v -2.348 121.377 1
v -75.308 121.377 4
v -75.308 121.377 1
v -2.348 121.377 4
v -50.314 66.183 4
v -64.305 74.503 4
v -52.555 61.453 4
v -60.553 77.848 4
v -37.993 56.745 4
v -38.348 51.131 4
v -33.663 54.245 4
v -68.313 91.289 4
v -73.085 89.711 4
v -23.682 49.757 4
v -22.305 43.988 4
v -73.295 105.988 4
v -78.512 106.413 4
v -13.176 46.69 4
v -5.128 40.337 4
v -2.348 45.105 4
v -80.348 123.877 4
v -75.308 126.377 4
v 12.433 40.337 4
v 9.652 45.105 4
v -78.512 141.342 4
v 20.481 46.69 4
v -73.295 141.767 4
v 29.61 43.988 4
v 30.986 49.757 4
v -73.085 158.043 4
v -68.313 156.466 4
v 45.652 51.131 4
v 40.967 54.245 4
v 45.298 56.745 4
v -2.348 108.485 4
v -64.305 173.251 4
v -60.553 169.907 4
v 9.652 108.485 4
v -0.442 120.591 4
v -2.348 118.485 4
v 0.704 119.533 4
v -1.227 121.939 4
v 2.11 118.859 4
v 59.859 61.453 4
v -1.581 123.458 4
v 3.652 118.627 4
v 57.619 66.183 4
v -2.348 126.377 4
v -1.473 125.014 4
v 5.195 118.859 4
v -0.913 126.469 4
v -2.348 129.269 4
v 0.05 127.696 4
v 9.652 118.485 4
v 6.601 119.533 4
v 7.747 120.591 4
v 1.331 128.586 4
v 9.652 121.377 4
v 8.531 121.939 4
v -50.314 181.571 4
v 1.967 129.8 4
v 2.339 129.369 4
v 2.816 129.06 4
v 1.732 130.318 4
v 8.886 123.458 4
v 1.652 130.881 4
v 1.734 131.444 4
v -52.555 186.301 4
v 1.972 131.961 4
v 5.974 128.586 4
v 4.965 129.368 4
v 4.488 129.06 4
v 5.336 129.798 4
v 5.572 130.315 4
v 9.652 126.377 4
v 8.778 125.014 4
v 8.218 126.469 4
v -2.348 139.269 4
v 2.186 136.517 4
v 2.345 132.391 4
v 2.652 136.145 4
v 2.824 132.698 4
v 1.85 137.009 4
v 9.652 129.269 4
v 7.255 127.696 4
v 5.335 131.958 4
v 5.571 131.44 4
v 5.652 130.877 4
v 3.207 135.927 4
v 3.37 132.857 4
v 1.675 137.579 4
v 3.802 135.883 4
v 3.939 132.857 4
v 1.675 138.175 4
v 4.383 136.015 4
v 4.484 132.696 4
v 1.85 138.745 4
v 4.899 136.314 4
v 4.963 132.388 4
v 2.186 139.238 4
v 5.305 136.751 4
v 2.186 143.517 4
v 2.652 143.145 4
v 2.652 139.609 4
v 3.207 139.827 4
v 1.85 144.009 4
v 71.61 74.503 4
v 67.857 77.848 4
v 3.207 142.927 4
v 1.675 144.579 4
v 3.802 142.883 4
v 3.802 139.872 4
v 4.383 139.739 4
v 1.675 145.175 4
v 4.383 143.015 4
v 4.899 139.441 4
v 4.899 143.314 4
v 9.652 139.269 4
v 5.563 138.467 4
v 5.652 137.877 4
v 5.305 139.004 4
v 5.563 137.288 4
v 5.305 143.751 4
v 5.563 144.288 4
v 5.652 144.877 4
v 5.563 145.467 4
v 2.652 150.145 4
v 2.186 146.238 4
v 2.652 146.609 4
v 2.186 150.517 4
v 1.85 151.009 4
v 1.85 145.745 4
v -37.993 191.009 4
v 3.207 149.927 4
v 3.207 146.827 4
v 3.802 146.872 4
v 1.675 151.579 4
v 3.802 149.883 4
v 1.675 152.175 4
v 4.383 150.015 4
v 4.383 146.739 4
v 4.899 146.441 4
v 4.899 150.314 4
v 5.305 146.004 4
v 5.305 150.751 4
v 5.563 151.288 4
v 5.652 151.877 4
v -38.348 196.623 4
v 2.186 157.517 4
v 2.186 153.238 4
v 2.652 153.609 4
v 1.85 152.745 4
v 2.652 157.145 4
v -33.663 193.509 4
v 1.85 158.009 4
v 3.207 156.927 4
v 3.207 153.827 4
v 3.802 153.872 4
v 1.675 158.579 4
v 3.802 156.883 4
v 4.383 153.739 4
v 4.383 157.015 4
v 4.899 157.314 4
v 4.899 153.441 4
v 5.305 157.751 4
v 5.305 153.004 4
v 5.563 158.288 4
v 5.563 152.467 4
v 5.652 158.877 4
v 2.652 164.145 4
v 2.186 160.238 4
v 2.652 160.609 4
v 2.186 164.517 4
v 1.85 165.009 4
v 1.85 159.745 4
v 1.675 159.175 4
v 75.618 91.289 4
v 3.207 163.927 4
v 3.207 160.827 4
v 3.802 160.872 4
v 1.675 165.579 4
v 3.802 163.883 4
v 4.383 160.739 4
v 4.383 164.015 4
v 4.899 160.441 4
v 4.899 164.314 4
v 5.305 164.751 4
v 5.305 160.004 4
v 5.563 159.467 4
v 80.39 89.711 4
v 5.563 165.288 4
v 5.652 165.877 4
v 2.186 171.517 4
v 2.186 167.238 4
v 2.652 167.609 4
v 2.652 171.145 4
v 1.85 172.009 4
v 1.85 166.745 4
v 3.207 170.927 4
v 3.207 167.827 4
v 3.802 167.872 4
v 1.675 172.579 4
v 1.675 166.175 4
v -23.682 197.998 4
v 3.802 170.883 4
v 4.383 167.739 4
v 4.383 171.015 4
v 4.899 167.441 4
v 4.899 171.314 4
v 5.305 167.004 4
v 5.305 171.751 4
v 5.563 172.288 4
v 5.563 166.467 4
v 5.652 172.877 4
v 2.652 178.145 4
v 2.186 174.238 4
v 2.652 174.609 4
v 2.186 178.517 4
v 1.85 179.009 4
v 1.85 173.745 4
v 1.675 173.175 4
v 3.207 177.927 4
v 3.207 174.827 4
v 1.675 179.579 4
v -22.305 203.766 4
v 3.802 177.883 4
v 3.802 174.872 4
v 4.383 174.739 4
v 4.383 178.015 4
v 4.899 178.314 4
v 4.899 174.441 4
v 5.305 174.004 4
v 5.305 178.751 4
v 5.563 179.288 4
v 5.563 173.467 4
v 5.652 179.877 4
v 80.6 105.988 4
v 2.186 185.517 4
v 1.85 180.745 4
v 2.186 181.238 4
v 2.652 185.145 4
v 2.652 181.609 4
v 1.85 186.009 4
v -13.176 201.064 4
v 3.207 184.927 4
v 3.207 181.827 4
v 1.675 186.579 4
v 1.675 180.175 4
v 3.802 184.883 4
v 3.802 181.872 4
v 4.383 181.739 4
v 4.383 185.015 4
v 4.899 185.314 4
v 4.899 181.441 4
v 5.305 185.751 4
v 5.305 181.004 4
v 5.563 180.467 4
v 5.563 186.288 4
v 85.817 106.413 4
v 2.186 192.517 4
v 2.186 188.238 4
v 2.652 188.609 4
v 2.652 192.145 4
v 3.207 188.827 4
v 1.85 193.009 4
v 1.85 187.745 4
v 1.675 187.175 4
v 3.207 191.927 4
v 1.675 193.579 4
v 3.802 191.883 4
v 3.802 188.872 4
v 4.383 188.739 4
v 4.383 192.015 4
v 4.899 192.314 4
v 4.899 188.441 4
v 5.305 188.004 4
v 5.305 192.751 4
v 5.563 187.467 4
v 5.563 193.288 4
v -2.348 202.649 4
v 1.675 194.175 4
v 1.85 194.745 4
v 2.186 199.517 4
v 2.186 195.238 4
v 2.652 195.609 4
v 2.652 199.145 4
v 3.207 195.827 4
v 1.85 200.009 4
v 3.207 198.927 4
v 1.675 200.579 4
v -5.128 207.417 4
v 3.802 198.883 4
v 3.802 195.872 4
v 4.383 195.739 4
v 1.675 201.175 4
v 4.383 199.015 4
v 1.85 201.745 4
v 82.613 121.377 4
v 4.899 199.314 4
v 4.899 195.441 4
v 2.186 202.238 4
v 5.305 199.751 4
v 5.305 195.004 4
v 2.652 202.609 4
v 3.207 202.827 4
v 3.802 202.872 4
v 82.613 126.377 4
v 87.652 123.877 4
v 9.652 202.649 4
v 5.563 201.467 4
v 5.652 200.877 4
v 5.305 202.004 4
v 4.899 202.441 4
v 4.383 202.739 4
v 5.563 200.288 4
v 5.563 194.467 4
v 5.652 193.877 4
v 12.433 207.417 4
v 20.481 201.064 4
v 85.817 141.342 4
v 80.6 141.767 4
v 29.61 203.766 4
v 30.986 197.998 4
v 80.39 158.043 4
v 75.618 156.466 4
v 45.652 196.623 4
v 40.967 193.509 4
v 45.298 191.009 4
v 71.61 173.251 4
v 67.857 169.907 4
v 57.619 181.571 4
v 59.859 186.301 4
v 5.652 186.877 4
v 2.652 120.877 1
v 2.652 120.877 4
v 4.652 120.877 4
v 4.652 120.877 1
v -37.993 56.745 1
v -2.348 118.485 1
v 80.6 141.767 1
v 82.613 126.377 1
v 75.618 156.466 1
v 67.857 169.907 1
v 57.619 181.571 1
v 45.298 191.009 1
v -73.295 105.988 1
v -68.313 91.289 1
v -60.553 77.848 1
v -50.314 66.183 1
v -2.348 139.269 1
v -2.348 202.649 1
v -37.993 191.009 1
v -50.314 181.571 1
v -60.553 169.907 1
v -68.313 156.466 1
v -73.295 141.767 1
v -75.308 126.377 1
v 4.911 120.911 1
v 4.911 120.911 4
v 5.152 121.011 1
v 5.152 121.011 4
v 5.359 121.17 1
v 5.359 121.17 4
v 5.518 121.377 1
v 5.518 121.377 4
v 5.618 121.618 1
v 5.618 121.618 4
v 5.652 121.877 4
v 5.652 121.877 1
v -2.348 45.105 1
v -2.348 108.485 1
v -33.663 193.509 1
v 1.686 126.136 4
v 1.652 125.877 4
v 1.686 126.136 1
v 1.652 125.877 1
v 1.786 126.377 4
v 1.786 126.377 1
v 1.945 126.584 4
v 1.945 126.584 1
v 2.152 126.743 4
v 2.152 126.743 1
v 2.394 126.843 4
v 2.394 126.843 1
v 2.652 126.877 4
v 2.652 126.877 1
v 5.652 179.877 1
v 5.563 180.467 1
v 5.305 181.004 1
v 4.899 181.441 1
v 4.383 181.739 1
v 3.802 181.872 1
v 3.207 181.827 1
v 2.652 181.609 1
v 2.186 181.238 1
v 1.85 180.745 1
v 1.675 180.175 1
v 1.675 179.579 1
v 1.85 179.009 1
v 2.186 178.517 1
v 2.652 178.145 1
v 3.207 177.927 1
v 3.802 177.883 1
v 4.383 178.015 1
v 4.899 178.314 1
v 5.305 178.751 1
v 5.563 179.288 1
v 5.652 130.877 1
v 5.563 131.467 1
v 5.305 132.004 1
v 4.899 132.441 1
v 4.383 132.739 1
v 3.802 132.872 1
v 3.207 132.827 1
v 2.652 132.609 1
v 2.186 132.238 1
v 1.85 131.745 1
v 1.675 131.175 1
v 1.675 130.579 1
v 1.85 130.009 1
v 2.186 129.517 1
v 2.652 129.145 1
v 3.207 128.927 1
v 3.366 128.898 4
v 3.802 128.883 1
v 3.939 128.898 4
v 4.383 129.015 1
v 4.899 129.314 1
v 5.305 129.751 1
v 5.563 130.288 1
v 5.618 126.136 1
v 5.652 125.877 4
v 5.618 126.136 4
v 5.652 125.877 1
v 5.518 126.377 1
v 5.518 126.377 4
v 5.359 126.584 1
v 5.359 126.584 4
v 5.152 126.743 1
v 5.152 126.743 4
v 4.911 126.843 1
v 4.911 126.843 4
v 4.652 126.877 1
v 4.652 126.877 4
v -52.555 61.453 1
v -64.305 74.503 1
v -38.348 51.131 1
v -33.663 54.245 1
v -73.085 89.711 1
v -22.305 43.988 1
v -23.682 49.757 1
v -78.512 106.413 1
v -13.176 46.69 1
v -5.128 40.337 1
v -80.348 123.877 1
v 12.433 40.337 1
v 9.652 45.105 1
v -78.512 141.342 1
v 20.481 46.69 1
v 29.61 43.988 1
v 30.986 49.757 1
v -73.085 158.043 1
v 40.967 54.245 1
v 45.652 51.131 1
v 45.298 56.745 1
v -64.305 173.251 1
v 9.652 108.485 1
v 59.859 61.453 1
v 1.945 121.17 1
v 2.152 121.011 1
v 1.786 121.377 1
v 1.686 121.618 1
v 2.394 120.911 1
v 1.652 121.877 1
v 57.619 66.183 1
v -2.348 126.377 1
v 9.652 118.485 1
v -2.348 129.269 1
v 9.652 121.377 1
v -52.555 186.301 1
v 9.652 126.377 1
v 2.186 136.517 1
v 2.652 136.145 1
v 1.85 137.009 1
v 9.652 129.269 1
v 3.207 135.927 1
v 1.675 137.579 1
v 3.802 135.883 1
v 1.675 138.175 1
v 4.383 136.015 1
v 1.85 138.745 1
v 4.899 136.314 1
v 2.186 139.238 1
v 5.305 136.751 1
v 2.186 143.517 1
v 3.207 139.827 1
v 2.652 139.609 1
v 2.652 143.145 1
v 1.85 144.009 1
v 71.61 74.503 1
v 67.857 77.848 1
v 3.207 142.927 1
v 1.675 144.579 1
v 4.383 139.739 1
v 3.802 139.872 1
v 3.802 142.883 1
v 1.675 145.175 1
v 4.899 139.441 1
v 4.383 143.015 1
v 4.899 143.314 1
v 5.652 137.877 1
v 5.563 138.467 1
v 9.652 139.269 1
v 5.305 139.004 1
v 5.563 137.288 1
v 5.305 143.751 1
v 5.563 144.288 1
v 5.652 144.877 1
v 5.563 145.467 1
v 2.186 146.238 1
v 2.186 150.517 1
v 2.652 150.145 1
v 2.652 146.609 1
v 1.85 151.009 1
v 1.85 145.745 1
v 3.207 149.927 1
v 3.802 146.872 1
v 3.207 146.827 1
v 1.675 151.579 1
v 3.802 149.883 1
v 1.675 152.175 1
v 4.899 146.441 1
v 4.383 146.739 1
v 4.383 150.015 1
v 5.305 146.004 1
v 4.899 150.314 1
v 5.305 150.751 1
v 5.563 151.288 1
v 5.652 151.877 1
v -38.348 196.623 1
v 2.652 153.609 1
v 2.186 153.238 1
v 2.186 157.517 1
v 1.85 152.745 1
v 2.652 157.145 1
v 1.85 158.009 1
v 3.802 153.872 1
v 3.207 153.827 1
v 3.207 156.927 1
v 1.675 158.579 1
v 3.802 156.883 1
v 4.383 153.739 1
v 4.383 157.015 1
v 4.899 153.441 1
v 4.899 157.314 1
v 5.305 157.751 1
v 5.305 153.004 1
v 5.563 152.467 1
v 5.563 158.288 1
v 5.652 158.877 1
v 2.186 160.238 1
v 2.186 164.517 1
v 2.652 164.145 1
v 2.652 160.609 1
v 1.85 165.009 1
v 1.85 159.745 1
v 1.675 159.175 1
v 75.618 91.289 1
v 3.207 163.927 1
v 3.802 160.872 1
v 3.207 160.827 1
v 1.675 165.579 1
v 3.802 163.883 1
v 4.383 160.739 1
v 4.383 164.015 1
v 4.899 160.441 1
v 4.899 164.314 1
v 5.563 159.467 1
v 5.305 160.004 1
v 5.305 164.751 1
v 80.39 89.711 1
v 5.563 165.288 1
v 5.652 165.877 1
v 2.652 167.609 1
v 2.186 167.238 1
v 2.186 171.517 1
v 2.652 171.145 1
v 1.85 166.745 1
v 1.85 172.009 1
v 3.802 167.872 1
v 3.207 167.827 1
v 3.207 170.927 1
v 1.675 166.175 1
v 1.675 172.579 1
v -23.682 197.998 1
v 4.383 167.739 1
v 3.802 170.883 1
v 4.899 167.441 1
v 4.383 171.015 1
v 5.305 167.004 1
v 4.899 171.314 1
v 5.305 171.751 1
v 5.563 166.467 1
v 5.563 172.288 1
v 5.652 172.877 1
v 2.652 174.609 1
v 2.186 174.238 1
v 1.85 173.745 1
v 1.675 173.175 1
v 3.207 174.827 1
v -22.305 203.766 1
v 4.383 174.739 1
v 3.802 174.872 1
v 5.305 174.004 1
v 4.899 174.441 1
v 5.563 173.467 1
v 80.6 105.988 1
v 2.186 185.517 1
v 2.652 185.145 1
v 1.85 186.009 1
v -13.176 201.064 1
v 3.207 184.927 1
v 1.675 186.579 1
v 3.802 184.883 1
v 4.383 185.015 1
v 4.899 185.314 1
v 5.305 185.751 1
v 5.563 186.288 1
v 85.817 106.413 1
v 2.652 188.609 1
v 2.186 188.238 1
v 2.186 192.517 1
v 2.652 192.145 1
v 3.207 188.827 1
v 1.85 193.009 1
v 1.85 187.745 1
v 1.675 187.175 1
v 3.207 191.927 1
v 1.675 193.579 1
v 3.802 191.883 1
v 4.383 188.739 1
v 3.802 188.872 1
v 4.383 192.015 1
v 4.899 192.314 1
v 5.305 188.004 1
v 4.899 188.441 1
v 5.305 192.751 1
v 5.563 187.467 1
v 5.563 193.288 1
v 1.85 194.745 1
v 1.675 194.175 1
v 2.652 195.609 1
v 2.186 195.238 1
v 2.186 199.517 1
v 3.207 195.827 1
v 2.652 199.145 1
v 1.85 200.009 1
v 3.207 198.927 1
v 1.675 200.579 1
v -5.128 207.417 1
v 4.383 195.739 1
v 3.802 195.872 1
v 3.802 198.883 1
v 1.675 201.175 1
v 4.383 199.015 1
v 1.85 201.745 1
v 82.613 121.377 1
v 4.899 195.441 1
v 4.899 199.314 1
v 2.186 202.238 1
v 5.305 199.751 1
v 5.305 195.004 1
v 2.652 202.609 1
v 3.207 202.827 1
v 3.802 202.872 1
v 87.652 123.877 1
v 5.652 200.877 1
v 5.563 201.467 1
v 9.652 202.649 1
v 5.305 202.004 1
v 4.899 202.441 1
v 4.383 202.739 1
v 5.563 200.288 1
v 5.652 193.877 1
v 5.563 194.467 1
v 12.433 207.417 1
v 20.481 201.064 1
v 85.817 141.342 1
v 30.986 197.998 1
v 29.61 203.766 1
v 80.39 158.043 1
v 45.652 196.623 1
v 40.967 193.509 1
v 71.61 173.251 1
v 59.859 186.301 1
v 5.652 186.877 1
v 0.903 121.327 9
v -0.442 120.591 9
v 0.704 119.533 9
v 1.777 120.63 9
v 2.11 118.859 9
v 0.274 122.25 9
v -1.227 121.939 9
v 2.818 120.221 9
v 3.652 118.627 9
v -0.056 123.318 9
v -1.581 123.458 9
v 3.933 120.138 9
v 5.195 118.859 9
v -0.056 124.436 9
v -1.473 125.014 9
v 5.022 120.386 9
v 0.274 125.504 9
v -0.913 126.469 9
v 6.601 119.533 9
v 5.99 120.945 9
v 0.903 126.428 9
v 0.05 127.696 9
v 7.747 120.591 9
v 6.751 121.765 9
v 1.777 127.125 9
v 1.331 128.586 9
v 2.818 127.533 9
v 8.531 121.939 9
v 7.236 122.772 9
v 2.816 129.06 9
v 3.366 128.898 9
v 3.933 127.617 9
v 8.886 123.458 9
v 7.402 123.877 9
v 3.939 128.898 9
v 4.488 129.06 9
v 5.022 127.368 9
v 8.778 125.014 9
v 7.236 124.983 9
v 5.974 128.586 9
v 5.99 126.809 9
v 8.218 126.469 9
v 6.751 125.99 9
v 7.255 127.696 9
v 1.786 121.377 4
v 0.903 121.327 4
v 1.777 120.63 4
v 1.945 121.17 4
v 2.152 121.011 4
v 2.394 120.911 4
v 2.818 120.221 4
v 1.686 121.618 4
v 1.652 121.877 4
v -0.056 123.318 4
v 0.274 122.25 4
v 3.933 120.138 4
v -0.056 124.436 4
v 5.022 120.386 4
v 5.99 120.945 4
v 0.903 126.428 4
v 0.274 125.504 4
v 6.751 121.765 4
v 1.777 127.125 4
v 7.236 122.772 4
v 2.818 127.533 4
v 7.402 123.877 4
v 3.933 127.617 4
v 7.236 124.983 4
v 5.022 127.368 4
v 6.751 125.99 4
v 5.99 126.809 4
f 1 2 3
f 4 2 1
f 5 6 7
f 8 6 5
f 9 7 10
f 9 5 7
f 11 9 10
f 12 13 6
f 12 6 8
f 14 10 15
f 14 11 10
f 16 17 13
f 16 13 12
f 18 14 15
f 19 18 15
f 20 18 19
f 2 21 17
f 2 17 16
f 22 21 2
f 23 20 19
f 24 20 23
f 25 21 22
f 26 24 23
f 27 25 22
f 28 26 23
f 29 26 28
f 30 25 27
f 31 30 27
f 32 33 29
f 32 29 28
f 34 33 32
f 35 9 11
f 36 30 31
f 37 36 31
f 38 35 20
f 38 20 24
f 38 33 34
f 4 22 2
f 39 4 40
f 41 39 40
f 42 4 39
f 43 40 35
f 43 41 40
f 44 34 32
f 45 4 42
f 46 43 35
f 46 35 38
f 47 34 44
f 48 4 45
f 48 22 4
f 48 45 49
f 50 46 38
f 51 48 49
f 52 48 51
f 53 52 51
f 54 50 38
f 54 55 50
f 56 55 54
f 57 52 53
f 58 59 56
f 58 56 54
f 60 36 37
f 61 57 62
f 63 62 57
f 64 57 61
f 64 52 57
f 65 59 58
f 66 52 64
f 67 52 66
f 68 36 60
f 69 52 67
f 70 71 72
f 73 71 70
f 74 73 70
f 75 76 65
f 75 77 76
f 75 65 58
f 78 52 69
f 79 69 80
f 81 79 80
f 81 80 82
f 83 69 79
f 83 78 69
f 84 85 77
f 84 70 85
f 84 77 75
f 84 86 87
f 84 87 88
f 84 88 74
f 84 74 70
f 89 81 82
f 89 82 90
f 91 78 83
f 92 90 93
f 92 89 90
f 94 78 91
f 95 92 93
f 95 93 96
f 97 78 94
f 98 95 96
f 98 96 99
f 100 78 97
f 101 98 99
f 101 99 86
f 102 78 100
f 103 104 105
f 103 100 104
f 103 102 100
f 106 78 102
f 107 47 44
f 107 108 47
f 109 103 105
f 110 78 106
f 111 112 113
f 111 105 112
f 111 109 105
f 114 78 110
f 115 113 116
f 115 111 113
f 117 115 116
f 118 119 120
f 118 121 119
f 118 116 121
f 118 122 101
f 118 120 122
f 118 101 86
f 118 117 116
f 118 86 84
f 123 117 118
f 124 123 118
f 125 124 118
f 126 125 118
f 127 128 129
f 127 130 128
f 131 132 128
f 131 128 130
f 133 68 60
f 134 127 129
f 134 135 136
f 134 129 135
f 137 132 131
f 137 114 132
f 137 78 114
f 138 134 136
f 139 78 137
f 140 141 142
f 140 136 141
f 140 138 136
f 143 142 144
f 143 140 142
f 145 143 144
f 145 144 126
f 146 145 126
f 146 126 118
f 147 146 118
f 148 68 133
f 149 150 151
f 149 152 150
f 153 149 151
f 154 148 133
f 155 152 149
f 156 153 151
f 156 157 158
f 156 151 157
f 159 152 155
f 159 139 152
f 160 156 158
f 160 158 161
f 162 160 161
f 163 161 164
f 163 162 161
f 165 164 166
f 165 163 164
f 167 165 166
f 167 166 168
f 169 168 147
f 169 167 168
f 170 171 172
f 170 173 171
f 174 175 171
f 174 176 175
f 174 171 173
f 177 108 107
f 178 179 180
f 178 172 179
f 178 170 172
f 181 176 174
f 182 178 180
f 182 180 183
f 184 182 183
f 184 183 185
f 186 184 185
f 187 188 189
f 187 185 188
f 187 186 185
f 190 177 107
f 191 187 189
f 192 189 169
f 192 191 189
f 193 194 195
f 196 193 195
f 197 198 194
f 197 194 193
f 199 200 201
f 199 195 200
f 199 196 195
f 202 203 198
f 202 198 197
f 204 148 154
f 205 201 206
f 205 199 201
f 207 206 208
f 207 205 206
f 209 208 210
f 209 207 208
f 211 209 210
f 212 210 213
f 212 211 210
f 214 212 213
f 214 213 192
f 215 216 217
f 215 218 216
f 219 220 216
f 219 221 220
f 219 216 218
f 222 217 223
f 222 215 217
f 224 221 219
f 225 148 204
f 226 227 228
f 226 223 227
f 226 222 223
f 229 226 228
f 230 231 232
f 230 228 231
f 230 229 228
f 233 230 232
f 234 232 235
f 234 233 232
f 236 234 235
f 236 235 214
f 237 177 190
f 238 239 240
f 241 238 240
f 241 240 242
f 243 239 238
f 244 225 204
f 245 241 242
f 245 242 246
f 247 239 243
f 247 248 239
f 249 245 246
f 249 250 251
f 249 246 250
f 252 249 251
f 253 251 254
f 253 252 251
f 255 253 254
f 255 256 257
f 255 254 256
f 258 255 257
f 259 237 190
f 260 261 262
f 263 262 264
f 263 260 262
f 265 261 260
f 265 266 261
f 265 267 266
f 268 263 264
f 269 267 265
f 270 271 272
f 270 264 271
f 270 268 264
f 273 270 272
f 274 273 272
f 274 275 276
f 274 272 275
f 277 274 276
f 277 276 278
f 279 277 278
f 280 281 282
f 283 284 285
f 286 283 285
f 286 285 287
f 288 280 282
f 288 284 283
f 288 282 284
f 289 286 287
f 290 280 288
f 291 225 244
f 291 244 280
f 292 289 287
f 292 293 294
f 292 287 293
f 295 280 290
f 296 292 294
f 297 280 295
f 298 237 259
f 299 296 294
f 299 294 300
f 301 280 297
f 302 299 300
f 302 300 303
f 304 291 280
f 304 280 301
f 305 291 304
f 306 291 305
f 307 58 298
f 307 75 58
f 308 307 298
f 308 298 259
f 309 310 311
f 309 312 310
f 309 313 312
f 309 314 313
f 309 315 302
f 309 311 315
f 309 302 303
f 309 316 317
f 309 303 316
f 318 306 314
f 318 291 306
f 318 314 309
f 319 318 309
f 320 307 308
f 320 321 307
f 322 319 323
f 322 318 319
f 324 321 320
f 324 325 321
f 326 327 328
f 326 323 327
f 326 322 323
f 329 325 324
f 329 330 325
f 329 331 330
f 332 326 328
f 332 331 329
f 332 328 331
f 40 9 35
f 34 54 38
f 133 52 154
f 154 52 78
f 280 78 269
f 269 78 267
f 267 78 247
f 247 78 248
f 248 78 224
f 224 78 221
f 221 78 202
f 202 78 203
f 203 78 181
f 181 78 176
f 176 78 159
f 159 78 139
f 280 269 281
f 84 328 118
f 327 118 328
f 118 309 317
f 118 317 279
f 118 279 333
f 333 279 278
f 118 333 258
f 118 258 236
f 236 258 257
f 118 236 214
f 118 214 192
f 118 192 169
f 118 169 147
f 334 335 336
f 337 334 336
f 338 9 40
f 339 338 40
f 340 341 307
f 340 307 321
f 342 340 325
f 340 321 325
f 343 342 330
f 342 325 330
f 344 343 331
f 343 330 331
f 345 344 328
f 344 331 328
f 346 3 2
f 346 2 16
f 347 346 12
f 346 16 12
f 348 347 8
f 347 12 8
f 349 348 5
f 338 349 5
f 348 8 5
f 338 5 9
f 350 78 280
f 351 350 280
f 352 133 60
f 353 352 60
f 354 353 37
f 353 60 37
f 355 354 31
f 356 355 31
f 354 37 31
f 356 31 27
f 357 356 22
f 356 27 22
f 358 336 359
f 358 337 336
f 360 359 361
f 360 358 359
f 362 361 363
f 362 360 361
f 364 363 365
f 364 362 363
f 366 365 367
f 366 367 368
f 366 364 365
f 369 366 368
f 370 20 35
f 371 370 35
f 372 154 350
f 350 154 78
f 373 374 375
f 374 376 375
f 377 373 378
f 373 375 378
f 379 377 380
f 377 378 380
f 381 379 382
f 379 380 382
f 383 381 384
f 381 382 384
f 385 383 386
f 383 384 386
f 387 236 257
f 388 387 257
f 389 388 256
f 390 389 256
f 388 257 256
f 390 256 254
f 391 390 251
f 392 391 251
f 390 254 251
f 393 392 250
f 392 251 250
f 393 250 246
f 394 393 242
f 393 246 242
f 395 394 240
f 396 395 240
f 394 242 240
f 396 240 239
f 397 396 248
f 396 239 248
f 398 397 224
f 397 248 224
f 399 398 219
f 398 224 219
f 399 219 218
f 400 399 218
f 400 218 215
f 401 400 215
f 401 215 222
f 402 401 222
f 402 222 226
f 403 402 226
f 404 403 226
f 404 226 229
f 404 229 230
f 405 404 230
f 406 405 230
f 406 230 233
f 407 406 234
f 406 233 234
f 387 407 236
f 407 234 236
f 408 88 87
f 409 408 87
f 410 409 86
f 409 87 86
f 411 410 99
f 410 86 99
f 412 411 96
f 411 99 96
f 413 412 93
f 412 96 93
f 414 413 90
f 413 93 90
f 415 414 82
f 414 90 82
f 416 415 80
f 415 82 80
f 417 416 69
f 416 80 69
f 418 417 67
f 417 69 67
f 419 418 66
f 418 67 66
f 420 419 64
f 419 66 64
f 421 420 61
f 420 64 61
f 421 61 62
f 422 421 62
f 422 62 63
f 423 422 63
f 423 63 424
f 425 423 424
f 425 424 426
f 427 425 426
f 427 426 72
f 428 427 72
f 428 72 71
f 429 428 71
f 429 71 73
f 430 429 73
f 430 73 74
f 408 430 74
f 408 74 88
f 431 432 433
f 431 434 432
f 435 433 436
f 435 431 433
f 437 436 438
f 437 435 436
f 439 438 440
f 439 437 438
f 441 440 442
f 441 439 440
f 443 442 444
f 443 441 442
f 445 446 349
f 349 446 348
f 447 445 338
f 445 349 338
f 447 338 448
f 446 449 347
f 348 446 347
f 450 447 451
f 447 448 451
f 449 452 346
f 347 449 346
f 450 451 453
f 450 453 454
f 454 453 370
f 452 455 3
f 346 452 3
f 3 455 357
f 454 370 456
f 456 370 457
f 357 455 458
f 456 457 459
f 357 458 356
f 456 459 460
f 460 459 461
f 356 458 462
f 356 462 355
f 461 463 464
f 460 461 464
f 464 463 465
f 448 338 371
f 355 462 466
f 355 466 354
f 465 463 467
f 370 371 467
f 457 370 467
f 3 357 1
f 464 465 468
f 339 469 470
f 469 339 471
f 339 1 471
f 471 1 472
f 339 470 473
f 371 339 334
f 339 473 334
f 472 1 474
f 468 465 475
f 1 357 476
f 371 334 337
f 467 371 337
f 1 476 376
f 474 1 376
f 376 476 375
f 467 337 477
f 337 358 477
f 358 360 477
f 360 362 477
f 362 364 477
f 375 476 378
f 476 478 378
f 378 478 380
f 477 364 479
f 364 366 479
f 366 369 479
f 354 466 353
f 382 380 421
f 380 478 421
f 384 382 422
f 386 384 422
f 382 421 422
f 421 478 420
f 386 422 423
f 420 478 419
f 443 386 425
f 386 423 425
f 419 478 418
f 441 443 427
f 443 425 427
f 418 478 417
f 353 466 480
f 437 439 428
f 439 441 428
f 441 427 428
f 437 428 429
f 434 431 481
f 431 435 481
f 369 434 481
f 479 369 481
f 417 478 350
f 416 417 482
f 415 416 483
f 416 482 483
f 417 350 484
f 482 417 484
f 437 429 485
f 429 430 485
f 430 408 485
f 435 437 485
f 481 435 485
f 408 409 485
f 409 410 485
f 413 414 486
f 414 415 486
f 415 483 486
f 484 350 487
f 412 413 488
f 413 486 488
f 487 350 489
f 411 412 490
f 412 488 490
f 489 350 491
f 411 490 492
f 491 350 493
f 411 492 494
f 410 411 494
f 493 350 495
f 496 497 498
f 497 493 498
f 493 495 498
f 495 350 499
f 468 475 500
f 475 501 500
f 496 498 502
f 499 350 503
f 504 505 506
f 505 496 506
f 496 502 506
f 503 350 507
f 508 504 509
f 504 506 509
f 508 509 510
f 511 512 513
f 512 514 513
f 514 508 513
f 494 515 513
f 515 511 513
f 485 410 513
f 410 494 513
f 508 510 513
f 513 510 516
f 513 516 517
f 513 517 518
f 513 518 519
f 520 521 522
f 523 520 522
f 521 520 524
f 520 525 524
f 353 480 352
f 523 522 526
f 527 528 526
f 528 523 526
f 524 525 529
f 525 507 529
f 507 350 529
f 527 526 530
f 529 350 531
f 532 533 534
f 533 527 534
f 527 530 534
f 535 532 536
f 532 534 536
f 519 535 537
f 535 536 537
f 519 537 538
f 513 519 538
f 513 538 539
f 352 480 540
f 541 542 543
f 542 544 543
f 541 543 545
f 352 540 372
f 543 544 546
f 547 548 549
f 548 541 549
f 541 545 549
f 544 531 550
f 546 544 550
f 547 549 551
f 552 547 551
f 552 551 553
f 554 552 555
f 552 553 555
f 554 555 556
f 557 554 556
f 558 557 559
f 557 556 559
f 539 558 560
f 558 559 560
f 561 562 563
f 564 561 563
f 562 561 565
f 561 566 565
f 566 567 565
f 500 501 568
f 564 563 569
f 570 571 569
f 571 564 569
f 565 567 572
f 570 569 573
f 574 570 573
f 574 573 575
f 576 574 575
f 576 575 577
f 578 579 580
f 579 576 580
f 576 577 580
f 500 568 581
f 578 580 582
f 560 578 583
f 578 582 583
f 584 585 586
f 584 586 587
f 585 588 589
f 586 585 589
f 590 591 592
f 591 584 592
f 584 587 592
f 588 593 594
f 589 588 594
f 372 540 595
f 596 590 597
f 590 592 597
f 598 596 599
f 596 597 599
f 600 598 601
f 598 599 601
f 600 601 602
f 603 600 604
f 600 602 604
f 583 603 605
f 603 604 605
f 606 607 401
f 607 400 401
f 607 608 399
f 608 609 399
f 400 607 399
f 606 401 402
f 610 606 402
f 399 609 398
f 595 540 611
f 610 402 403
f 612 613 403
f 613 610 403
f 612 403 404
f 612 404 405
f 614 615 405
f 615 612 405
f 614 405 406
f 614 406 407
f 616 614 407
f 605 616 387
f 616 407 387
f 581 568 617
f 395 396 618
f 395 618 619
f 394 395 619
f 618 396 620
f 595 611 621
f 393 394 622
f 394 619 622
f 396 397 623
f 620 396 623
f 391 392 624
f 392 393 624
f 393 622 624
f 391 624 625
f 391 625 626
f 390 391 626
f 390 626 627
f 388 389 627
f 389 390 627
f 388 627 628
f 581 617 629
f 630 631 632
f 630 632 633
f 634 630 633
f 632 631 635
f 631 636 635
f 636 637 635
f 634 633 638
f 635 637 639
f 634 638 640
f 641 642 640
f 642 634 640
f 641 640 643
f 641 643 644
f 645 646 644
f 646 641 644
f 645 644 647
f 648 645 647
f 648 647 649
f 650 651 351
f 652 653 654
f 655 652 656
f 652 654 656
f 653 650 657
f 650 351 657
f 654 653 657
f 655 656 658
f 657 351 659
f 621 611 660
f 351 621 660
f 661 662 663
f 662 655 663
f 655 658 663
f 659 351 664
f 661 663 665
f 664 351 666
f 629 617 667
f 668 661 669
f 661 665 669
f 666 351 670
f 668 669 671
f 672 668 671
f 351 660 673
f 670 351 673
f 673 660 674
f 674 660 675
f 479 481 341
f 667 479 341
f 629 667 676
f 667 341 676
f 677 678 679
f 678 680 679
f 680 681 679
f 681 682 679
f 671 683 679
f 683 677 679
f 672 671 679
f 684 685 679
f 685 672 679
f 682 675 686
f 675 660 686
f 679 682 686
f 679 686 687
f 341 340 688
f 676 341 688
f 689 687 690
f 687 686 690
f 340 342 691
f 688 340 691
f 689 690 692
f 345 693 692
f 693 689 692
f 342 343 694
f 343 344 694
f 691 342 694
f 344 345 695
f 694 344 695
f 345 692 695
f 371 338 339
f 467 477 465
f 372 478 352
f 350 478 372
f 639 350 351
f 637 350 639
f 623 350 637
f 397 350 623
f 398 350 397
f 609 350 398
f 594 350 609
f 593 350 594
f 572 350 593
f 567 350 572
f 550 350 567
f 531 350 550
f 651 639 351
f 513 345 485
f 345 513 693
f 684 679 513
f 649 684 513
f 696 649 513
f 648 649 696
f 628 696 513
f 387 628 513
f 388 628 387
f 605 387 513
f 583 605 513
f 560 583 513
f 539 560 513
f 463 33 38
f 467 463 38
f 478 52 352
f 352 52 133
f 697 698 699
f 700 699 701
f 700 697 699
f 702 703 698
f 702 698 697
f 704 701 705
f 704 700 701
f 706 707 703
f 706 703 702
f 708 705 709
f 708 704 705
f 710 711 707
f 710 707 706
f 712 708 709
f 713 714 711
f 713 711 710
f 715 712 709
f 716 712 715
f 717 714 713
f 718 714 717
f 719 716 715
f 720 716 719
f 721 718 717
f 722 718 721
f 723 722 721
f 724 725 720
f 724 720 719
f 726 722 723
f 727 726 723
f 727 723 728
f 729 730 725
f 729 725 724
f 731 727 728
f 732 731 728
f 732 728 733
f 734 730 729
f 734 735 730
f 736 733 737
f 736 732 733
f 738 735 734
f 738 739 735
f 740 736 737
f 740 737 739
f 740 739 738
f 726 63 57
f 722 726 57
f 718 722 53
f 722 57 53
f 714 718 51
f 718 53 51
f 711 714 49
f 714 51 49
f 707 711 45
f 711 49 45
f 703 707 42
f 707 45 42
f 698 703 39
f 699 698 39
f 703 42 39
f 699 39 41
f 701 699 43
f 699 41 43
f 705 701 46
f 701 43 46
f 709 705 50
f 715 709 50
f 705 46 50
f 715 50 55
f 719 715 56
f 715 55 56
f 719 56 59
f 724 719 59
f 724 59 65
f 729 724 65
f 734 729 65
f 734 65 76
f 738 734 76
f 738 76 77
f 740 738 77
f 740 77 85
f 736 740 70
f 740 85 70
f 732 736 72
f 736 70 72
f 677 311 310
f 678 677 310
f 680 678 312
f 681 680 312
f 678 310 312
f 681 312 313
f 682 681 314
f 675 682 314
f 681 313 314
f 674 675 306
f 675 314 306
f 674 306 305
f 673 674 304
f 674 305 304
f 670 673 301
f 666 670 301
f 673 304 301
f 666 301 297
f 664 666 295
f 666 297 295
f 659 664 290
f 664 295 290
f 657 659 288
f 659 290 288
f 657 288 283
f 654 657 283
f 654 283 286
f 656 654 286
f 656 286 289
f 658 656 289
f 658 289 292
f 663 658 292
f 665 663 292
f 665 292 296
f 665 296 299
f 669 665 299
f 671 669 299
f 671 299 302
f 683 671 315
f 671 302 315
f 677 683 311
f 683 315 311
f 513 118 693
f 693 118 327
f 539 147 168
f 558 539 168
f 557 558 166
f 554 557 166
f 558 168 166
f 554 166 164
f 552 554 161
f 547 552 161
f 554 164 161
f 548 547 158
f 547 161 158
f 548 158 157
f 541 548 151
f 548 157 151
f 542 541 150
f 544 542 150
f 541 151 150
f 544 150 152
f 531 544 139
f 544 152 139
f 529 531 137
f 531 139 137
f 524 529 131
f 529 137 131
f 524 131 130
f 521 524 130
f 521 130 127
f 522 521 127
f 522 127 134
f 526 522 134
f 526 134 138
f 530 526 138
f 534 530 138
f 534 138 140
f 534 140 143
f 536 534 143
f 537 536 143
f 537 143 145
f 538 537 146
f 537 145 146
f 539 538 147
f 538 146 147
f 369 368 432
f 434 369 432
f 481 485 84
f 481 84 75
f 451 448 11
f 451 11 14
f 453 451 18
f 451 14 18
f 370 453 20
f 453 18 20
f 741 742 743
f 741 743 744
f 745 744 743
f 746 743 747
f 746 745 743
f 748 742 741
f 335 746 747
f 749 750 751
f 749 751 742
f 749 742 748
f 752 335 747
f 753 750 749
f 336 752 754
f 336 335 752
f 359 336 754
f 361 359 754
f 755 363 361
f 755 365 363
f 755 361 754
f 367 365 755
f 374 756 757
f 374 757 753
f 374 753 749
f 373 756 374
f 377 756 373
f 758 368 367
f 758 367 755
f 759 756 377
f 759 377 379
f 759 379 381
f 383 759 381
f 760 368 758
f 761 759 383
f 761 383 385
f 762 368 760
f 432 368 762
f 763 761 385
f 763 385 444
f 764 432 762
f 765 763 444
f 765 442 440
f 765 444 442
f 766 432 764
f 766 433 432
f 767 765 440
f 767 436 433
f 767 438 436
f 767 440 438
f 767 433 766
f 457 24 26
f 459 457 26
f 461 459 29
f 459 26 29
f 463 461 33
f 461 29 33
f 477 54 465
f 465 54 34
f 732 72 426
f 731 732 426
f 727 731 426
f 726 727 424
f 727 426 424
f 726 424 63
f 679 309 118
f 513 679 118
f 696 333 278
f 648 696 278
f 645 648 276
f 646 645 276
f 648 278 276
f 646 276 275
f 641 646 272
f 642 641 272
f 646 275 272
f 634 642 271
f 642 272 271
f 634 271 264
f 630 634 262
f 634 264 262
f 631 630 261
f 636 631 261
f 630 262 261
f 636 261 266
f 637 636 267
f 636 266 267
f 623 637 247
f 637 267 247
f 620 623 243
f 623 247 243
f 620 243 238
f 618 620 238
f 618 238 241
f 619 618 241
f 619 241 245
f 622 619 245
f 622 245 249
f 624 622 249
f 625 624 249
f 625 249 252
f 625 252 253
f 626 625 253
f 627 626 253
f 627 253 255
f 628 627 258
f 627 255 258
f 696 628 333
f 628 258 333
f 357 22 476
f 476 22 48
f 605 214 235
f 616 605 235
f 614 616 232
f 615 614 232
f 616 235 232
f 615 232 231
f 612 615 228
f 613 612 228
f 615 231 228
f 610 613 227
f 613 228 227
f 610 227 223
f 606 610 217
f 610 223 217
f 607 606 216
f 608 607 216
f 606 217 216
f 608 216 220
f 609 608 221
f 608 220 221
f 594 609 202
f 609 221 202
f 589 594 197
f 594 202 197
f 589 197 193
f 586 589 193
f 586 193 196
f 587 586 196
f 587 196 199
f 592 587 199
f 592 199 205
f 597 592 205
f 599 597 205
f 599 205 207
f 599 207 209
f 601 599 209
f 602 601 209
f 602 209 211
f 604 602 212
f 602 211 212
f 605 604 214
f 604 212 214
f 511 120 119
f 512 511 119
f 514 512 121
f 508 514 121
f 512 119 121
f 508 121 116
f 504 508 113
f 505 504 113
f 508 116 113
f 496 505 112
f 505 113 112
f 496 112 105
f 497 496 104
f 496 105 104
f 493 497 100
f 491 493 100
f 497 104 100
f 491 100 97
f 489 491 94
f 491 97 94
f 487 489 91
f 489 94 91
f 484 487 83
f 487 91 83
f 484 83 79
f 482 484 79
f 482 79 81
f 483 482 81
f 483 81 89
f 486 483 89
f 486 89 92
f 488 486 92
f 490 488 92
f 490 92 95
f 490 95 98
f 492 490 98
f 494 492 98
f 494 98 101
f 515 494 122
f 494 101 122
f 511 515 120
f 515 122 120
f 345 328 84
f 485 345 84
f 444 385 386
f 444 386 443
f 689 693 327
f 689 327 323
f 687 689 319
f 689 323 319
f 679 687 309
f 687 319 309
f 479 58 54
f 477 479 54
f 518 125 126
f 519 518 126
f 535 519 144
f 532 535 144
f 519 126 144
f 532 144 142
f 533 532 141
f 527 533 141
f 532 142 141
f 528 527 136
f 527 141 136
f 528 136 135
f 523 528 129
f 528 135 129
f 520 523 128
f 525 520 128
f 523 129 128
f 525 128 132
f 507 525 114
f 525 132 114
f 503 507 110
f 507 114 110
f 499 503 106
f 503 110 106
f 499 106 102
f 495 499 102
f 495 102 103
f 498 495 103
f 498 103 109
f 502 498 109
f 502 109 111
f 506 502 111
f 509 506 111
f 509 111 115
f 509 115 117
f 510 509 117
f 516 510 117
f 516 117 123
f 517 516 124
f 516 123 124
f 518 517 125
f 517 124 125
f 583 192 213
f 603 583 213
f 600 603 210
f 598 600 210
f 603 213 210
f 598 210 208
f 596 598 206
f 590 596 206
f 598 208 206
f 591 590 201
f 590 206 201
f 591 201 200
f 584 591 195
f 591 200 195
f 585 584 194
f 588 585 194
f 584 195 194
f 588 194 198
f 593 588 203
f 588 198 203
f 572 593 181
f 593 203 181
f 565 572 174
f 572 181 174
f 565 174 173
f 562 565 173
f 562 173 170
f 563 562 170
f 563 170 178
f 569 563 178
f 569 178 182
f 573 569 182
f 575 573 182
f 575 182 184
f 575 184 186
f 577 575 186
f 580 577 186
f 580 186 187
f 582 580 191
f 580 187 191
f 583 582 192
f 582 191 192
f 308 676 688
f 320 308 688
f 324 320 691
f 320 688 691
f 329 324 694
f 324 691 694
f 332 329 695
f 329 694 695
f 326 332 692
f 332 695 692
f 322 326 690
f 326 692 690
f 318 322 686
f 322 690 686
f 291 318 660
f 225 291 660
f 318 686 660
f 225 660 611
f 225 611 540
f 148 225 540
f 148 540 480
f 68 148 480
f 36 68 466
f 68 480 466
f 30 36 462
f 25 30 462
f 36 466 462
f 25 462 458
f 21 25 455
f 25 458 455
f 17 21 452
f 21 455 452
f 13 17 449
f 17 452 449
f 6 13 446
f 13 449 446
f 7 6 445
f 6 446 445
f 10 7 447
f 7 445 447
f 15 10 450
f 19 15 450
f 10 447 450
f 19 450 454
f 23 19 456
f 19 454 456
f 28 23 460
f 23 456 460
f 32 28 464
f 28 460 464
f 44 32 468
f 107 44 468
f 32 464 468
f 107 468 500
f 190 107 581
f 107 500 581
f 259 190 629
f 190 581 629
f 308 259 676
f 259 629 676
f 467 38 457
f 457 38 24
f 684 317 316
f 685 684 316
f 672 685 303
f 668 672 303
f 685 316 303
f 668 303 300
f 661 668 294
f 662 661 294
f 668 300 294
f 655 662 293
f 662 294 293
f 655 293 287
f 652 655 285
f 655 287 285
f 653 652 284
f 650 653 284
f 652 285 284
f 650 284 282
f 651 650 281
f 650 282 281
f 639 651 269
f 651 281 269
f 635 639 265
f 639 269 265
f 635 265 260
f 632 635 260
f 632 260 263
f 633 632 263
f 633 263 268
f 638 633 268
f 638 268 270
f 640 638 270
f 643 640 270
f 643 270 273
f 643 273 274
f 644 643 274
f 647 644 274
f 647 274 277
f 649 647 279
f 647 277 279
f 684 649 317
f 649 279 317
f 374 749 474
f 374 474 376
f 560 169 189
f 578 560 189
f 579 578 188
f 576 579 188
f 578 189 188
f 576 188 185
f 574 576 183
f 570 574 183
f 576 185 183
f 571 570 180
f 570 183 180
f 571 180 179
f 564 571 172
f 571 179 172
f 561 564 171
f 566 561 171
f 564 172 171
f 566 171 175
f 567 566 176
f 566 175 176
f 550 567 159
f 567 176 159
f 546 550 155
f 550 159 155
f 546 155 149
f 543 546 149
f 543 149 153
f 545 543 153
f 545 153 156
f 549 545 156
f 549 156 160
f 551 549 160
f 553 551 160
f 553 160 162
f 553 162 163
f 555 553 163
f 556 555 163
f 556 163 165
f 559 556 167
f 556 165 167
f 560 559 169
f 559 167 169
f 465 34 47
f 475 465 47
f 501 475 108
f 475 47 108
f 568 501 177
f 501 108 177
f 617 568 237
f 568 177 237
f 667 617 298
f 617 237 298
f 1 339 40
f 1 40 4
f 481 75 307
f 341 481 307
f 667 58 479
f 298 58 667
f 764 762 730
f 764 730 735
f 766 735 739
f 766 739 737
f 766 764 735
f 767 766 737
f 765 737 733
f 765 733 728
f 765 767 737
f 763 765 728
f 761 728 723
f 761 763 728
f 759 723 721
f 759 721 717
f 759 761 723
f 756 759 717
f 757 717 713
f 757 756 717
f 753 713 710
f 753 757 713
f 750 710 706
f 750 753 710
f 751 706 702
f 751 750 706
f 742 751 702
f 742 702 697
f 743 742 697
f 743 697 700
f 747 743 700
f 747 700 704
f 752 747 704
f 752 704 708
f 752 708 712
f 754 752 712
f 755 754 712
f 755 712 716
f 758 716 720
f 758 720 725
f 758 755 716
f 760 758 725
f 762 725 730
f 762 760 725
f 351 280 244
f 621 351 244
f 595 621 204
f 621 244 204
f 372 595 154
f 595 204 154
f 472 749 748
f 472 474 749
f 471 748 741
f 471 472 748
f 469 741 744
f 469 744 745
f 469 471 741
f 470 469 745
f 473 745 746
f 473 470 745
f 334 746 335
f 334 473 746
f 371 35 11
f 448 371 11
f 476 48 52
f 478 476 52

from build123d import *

# Parameters (mm, degrees)
SKETCH2_R               = 84
BOSS_EXTRUDE1_DEPTH     = 3
SKETCH3_R               = 2
CUT_EXTRUDE1_DEPTH      = 3
SKETCH5_W               = 73
SKETCH5_H               = 5
BOSS_EXTRUDE2_DEPTH     = 3
SKETCH6_R               = 2
CUT_EXTRUDE2_DEPTH      = 226.621039578
SKETCH12_W              = 4
SKETCH12_H              = 6
CUT_EXTRUDE3_DEPTH      = 3
FILLET1_R               = 1
BOSS_EXTRUDE3_OUTLINE_R = 3.75
BOSS_EXTRUDE3_DEPTH     = 5
SKETCH16_R              = 2
CUT_EXTRUDE4_DEPTH      = 15.2
CUT_EXTRUDE5_START      = -2
CUT_EXTRUDE5_DEPTH      = 2


# Read off the part's stored shape, not the designer's step: Boss-Extrude3
with BuildPart() as part:
    # Sketch2 → Boss-Extrude1 (new body)
    with BuildSketch(Plane.XY.offset(1)):
        with Locations((3.652326605, 123.87718283)):
            Circle(SKETCH2_R)
    extrude(amount=BOSS_EXTRUDE1_DEPTH)

    # Sketch3 → Cut-Extrude1 (cut)
    with BuildSketch(Plane.XY.offset(4)):
        with BuildLine():
            Line((-2.347673395, 45.105360456), (-2.347673395, 202.649005203))
            ThreePointArc((-2.347673395, 202.649005203), (-75.347673395, 123.87718283), (-2.347673395, 45.105360456))
        make_face()
        with BuildLine():
            Line((9.652326605, 202.649005203), (9.652326605, 45.105360456))
            ThreePointArc((9.652326605, 45.105360456), (61.596265028, 70.178951946), (82.652326605, 123.87718283))
            ThreePointArc((82.652326605, 123.87718283), (61.596265028, 177.575413713), (9.652326605, 202.649005203))
        make_face()
        with Locations((3.652326605, 200.87718283)):
            Circle(SKETCH3_R)
        with Locations((3.652326605, 193.87718283)):
            Circle(SKETCH3_R)
        with Locations((3.652326605, 186.87718283)):
            Circle(SKETCH3_R)
        with Locations((3.652326605, 179.87718283)):
            Circle(SKETCH3_R)
        with Locations((3.652326605, 172.87718283)):
            Circle(SKETCH3_R)
        with Locations((3.652326605, 165.87718283)):
            Circle(SKETCH3_R)
        with Locations((3.652326605, 158.87718283)):
            Circle(SKETCH3_R)
        with Locations((3.652326605, 151.87718283)):
            Circle(SKETCH3_R)
        with Locations((3.652326605, 144.87718283)):
            Circle(SKETCH3_R)
        with Locations((3.652326605, 123.87718283)):
            Circle(SKETCH3_R)
        with Locations((3.652326605, 130.87718283)):
            Circle(SKETCH3_R)
        with Locations((3.652326605, 137.87718283)):
            Circle(SKETCH3_R)
    extrude(amount=-CUT_EXTRUDE1_DEPTH, mode=Mode.SUBTRACT)

    # Sketch5 → Boss-Extrude2 (add)
    with BuildSketch(Plane.XY.offset(4)):
        with Locations((46.152326605, 123.87718283)):
            Rectangle(SKETCH5_W, SKETCH5_H)
        Polygon((4.487263096, 117.431030407), (8.817390114, 119.931030407), (45.317390114, 56.711175931), (40.987263096, 54.211175931), align=None)
        Polygon((-1.512736904, 119.931030407), (2.817390114, 117.431030407), (-33.682609886, 54.211175931), (-38.012736904, 56.711175931), align=None)
        with Locations((-38.847673395, 123.87718283)):
            Rectangle(SKETCH5_W, SKETCH5_H)
        Polygon((2.817390114, 130.323335252), (-1.512736904, 127.823335252), (-38.012736904, 191.043189729), (-33.682609886, 193.543189729), align=None)
        Polygon((8.817390114, 127.823335252), (4.487263096, 130.323335252), (40.987263096, 193.543189729), (45.317390114, 191.043189729), align=None)
    extrude(amount=-BOSS_EXTRUDE2_DEPTH)

    # Sketch6 → Cut-Extrude2 (cut, through all)
    with BuildSketch(Plane.XY.offset(4)):
        with Locations((3.652326605, 130.87718283)):
            Circle(SKETCH6_R)
    extrude(amount=-CUT_EXTRUDE2_DEPTH, mode=Mode.SUBTRACT)

    # Sketch12 → Cut-Extrude3 (cut)
    with BuildSketch(Plane.XY.offset(4)):
        with Locations((3.652326605, 123.87718283)):
            Rectangle(SKETCH12_W, SKETCH12_H)
    extrude(amount=-CUT_EXTRUDE3_DEPTH, mode=Mode.SUBTRACT)

    # Fillet1
    fillet1_edges = [part.edges().sort_by_distance(p)[0] for p in [
        (1.652326605, 120.87718283, 2.5),
        (5.652326605, 126.87718283, 2.5),
        (1.652326605, 126.87718283, 2.5),
        (5.652326605, 120.87718283, 2.5),
    ]]
    fillet(fillet1_edges, radius=FILLET1_R)

    # Boss-Extrude3 outline → Boss-Extrude3 (add)
    with BuildSketch(Plane.XY.offset(4)):
        with BuildLine():
            ThreePointArc((4.48817395, 129.060218544), (3.652326605, 128.87718283), (2.81647926, 129.060218544))
            ThreePointArc((2.81647926, 129.060218544), (3.652326605, 118.62718283), (4.48817395, 129.060218544))
        make_face()
        with Locations((3.652326605, 123.87718283)):
            Circle(BOSS_EXTRUDE3_OUTLINE_R, mode=Mode.SUBTRACT)
    extrude(amount=BOSS_EXTRUDE3_DEPTH)

    # Sketch16 → Cut-Extrude4 (cut)
    with BuildSketch(Plane.XY.offset(16.2)):
        with Locations((3.652326605, 123.87718283)):
            Circle(SKETCH16_R)
    extrude(amount=-CUT_EXTRUDE4_DEPTH, mode=Mode.SUBTRACT)

    # Sketch17 → Cut-Extrude5 (cut)
    with BuildSketch(Plane.XY.offset(16.2).offset(CUT_EXTRUDE5_START)):
        with BuildLine():
            ThreePointArc((2.652326605, 127.491390903), (1.000676176, 126.528833259), (0.038118531, 124.87718283))
            Line((0.038118531, 124.87718283), (1.920275797, 124.87718283))
            ThreePointArc((1.920275797, 124.87718283), (2.238113043, 125.291396392), (2.652326605, 125.609233637))
            Line((2.652326605, 125.609233637), (2.652326605, 127.491390903))
        make_face()
        with BuildLine():
            ThreePointArc((0.038118531, 122.87718283), (1.000676176, 121.2255324), (2.652326605, 120.262974756))
            Line((2.652326605, 120.262974756), (2.652326605, 122.145132022))
            ThreePointArc((2.652326605, 122.145132022), (2.238113043, 122.462969267), (1.920275797, 122.87718283))
            Line((1.920275797, 122.87718283), (0.038118531, 122.87718283))
        make_face()
        with BuildLine():
            Line((4.652326605, 122.145132022), (4.652326605, 120.262974756))
            ThreePointArc((4.652326605, 120.262974756), (6.303977034, 121.2255324), (7.266534679, 122.87718283))
            Line((7.266534679, 122.87718283), (5.384377413, 122.87718283))
            ThreePointArc((5.384377413, 122.87718283), (5.066540167, 122.462969267), (4.652326605, 122.145132022))
        make_face()
        with BuildLine():
            Line((5.384377413, 124.87718283), (7.266534679, 124.87718283))
            ThreePointArc((7.266534679, 124.87718283), (6.303977034, 126.528833259), (4.652326605, 127.491390903))
            Line((4.652326605, 127.491390903), (4.652326605, 125.609233637))
            ThreePointArc((4.652326605, 125.609233637), (5.066540167, 125.291396392), (5.384377413, 124.87718283))
        make_face()
    extrude(amount=CUT_EXTRUDE5_DEPTH, mode=Mode.SUBTRACT)


solid = part.part
